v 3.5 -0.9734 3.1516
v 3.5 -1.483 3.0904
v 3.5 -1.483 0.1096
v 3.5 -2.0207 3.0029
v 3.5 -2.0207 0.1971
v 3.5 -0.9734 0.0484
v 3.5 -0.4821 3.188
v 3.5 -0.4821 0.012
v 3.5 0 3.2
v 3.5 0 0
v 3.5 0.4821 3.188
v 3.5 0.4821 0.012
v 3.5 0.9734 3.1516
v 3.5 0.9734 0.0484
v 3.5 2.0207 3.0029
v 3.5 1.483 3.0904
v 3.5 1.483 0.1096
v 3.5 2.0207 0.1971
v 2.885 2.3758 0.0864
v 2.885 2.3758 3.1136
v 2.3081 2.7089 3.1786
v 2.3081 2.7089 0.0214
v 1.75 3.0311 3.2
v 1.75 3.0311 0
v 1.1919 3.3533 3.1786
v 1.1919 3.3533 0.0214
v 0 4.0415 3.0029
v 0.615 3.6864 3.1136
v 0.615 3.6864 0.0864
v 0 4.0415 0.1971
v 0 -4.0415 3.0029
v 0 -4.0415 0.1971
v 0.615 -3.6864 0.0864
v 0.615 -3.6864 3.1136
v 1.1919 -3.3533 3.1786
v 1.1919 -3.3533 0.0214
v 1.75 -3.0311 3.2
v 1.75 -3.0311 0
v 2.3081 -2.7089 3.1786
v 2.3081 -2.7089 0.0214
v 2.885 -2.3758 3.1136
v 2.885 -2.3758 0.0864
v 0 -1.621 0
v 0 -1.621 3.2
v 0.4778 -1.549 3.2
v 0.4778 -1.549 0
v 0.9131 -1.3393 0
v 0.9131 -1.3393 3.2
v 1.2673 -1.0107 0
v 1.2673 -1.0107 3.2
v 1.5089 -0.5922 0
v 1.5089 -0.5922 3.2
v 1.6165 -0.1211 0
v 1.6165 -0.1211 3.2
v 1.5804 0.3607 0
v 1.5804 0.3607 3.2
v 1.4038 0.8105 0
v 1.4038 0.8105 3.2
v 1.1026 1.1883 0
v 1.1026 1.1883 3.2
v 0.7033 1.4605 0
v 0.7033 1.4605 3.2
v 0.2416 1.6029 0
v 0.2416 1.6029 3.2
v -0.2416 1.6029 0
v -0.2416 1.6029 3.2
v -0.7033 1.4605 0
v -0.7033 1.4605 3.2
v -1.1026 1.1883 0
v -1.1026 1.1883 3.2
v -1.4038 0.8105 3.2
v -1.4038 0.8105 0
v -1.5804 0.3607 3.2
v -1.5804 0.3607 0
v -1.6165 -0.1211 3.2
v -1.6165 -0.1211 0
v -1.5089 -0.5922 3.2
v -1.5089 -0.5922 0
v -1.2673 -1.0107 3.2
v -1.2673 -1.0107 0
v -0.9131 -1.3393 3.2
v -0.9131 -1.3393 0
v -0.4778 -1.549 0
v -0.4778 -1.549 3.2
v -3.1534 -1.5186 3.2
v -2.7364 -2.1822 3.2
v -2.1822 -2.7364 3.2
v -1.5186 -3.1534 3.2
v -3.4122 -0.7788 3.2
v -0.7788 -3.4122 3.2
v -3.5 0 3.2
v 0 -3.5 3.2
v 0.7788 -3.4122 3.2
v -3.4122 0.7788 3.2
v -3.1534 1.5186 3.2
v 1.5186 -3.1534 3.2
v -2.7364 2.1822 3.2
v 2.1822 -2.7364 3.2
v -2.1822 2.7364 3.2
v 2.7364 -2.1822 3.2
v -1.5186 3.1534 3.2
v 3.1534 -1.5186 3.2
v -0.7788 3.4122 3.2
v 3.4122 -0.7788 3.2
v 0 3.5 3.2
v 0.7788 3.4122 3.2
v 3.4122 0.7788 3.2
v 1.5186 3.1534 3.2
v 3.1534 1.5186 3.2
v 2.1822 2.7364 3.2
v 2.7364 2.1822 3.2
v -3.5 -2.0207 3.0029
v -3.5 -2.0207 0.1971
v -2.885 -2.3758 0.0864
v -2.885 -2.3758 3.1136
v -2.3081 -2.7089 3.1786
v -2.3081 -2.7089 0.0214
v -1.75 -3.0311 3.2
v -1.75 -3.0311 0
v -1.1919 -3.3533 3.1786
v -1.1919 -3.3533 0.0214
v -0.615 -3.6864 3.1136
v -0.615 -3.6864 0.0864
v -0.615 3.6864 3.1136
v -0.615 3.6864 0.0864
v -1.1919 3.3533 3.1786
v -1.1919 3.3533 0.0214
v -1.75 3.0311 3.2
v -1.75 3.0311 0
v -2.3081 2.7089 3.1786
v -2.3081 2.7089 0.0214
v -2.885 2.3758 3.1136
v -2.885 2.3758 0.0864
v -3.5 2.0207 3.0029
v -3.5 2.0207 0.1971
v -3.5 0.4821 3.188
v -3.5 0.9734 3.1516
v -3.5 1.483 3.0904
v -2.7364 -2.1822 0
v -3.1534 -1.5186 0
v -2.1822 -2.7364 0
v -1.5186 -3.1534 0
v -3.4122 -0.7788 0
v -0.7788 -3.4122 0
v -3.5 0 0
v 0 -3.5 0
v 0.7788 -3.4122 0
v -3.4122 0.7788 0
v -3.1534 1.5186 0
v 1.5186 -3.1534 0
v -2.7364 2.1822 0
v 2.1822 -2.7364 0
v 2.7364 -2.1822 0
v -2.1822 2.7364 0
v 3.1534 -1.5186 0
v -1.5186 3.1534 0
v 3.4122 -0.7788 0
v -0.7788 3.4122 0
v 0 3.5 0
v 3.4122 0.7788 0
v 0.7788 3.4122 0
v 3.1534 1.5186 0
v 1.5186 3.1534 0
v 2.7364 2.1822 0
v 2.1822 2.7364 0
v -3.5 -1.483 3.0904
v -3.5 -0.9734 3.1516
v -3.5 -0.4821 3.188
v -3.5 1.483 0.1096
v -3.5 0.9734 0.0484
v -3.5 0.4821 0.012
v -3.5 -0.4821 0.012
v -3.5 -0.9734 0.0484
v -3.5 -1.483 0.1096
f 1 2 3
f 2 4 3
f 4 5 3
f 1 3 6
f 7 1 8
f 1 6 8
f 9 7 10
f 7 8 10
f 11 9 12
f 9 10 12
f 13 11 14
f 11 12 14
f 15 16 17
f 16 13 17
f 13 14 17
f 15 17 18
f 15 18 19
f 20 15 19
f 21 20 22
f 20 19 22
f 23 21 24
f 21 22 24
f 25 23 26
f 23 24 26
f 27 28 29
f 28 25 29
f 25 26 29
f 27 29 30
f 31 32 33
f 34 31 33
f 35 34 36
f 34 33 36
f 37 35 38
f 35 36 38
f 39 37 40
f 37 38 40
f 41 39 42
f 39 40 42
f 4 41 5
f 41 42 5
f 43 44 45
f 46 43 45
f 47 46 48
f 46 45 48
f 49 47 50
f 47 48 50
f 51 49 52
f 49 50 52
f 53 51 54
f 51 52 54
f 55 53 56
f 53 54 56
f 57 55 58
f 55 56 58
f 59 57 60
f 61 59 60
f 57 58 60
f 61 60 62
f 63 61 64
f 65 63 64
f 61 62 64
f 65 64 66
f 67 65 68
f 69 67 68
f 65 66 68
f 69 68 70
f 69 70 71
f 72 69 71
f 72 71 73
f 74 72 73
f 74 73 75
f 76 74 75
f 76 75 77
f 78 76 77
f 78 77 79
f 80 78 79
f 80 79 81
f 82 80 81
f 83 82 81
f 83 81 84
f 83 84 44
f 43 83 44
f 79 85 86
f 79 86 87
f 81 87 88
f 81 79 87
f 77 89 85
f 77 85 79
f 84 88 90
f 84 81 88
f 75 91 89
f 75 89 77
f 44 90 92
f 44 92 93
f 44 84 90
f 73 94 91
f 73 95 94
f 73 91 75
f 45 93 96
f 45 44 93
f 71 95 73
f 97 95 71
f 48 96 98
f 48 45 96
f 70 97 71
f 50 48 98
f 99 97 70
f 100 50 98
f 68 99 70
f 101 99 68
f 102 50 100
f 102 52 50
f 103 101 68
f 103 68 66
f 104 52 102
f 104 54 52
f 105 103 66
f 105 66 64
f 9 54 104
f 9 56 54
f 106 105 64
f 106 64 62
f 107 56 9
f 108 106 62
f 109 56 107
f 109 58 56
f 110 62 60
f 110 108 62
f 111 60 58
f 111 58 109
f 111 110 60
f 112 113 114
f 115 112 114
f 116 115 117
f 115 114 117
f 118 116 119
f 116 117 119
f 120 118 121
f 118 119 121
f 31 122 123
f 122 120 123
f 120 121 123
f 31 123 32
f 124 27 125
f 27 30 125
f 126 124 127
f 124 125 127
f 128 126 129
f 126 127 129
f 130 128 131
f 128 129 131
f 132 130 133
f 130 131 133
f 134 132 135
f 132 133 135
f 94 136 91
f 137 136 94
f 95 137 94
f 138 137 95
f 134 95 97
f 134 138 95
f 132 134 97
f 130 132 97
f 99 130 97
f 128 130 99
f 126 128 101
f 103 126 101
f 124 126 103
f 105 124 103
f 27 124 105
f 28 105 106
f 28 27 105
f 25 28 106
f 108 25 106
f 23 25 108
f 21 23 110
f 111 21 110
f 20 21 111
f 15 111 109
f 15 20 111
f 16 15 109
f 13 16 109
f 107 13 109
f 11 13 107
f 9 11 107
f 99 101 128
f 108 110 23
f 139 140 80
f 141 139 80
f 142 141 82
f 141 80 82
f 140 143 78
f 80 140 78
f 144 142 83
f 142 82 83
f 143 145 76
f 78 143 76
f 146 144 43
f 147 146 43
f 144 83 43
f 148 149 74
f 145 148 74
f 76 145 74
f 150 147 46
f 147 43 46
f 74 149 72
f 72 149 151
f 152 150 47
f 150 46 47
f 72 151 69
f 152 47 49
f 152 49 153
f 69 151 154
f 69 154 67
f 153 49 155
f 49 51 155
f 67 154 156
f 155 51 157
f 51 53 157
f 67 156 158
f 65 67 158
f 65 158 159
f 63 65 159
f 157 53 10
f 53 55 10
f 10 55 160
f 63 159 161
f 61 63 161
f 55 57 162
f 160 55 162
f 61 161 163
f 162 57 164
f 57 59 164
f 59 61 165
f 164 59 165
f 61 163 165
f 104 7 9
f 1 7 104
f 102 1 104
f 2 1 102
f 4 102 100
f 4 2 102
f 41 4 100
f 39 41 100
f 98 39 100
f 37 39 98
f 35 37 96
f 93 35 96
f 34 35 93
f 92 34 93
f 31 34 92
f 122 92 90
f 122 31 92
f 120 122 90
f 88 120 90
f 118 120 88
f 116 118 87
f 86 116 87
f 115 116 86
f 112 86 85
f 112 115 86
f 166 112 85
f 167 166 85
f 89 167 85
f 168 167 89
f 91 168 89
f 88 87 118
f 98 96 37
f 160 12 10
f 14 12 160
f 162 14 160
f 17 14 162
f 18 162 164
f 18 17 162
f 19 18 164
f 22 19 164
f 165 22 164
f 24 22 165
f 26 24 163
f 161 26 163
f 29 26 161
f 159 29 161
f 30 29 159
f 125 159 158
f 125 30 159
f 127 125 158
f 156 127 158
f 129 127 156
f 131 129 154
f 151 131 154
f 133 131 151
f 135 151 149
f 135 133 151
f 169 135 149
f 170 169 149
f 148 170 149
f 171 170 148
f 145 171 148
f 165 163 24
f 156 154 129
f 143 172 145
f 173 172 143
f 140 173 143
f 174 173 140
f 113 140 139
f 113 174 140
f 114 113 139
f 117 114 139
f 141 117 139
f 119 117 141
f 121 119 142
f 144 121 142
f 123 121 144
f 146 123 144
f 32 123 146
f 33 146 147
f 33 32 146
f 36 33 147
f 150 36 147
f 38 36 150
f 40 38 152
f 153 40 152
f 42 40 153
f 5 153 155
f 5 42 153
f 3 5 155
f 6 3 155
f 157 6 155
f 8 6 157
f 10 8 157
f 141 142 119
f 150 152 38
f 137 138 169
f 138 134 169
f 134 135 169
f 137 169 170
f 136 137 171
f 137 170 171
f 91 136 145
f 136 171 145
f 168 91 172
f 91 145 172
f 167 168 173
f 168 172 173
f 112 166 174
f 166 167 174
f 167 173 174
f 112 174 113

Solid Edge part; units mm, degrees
sketch "Sketch1" plane through (0, 0, 0) normal (0, 0, 1) x (1, 0, 0)
  line L0 (-3.5, 2.0207) -> (-3.5, -2.0207)
  line L1 (-3.5, -2.0207) -> (0, -4.0415)
  line L2 (0, -4.0415) -> (3.5, -2.0207)
  line L3 (3.5, -2.0207) -> (3.5, 2.0207)
  line L4 (3.5, 2.0207) -> (0, 4.0415)
  line L5 (0, 4.0415) -> (-3.5, 2.0207)
extrude "Protrusion1" add sketch "Sketch1" along normal blind 3.2
hole "Hole1" at (0, 0, 3.2) direction (0, 0, -1) diameter 3.242 end up to next
sketch "Sketch2" plane through (0, 0, 0) normal (1, 0, 0) x (0, 1, 0)
  line L0 (3.5, 3.2) -> (4.0415, 3.0029)
revolve "RevolvedCutout1" cut sketch "Sketch2" angle 360 about axis through (0, 0, -60.325) along (0, 0, 1) material side at (0, 3.7879, 3.1484)
sketch "Sketch3" plane through (0, 0, 0) normal (1, 0, 0) x (0, 1, 0)
  line L0 (4.0415, 0.1971) -> (3.5, 0)
revolve "RevolvedCutout2" cut sketch "Sketch3" angle 360 about axis through (0, 0, -60.325) along (0, 0, 1) material side at (0, 3.7879, 0.0516)
properties part number "062"
